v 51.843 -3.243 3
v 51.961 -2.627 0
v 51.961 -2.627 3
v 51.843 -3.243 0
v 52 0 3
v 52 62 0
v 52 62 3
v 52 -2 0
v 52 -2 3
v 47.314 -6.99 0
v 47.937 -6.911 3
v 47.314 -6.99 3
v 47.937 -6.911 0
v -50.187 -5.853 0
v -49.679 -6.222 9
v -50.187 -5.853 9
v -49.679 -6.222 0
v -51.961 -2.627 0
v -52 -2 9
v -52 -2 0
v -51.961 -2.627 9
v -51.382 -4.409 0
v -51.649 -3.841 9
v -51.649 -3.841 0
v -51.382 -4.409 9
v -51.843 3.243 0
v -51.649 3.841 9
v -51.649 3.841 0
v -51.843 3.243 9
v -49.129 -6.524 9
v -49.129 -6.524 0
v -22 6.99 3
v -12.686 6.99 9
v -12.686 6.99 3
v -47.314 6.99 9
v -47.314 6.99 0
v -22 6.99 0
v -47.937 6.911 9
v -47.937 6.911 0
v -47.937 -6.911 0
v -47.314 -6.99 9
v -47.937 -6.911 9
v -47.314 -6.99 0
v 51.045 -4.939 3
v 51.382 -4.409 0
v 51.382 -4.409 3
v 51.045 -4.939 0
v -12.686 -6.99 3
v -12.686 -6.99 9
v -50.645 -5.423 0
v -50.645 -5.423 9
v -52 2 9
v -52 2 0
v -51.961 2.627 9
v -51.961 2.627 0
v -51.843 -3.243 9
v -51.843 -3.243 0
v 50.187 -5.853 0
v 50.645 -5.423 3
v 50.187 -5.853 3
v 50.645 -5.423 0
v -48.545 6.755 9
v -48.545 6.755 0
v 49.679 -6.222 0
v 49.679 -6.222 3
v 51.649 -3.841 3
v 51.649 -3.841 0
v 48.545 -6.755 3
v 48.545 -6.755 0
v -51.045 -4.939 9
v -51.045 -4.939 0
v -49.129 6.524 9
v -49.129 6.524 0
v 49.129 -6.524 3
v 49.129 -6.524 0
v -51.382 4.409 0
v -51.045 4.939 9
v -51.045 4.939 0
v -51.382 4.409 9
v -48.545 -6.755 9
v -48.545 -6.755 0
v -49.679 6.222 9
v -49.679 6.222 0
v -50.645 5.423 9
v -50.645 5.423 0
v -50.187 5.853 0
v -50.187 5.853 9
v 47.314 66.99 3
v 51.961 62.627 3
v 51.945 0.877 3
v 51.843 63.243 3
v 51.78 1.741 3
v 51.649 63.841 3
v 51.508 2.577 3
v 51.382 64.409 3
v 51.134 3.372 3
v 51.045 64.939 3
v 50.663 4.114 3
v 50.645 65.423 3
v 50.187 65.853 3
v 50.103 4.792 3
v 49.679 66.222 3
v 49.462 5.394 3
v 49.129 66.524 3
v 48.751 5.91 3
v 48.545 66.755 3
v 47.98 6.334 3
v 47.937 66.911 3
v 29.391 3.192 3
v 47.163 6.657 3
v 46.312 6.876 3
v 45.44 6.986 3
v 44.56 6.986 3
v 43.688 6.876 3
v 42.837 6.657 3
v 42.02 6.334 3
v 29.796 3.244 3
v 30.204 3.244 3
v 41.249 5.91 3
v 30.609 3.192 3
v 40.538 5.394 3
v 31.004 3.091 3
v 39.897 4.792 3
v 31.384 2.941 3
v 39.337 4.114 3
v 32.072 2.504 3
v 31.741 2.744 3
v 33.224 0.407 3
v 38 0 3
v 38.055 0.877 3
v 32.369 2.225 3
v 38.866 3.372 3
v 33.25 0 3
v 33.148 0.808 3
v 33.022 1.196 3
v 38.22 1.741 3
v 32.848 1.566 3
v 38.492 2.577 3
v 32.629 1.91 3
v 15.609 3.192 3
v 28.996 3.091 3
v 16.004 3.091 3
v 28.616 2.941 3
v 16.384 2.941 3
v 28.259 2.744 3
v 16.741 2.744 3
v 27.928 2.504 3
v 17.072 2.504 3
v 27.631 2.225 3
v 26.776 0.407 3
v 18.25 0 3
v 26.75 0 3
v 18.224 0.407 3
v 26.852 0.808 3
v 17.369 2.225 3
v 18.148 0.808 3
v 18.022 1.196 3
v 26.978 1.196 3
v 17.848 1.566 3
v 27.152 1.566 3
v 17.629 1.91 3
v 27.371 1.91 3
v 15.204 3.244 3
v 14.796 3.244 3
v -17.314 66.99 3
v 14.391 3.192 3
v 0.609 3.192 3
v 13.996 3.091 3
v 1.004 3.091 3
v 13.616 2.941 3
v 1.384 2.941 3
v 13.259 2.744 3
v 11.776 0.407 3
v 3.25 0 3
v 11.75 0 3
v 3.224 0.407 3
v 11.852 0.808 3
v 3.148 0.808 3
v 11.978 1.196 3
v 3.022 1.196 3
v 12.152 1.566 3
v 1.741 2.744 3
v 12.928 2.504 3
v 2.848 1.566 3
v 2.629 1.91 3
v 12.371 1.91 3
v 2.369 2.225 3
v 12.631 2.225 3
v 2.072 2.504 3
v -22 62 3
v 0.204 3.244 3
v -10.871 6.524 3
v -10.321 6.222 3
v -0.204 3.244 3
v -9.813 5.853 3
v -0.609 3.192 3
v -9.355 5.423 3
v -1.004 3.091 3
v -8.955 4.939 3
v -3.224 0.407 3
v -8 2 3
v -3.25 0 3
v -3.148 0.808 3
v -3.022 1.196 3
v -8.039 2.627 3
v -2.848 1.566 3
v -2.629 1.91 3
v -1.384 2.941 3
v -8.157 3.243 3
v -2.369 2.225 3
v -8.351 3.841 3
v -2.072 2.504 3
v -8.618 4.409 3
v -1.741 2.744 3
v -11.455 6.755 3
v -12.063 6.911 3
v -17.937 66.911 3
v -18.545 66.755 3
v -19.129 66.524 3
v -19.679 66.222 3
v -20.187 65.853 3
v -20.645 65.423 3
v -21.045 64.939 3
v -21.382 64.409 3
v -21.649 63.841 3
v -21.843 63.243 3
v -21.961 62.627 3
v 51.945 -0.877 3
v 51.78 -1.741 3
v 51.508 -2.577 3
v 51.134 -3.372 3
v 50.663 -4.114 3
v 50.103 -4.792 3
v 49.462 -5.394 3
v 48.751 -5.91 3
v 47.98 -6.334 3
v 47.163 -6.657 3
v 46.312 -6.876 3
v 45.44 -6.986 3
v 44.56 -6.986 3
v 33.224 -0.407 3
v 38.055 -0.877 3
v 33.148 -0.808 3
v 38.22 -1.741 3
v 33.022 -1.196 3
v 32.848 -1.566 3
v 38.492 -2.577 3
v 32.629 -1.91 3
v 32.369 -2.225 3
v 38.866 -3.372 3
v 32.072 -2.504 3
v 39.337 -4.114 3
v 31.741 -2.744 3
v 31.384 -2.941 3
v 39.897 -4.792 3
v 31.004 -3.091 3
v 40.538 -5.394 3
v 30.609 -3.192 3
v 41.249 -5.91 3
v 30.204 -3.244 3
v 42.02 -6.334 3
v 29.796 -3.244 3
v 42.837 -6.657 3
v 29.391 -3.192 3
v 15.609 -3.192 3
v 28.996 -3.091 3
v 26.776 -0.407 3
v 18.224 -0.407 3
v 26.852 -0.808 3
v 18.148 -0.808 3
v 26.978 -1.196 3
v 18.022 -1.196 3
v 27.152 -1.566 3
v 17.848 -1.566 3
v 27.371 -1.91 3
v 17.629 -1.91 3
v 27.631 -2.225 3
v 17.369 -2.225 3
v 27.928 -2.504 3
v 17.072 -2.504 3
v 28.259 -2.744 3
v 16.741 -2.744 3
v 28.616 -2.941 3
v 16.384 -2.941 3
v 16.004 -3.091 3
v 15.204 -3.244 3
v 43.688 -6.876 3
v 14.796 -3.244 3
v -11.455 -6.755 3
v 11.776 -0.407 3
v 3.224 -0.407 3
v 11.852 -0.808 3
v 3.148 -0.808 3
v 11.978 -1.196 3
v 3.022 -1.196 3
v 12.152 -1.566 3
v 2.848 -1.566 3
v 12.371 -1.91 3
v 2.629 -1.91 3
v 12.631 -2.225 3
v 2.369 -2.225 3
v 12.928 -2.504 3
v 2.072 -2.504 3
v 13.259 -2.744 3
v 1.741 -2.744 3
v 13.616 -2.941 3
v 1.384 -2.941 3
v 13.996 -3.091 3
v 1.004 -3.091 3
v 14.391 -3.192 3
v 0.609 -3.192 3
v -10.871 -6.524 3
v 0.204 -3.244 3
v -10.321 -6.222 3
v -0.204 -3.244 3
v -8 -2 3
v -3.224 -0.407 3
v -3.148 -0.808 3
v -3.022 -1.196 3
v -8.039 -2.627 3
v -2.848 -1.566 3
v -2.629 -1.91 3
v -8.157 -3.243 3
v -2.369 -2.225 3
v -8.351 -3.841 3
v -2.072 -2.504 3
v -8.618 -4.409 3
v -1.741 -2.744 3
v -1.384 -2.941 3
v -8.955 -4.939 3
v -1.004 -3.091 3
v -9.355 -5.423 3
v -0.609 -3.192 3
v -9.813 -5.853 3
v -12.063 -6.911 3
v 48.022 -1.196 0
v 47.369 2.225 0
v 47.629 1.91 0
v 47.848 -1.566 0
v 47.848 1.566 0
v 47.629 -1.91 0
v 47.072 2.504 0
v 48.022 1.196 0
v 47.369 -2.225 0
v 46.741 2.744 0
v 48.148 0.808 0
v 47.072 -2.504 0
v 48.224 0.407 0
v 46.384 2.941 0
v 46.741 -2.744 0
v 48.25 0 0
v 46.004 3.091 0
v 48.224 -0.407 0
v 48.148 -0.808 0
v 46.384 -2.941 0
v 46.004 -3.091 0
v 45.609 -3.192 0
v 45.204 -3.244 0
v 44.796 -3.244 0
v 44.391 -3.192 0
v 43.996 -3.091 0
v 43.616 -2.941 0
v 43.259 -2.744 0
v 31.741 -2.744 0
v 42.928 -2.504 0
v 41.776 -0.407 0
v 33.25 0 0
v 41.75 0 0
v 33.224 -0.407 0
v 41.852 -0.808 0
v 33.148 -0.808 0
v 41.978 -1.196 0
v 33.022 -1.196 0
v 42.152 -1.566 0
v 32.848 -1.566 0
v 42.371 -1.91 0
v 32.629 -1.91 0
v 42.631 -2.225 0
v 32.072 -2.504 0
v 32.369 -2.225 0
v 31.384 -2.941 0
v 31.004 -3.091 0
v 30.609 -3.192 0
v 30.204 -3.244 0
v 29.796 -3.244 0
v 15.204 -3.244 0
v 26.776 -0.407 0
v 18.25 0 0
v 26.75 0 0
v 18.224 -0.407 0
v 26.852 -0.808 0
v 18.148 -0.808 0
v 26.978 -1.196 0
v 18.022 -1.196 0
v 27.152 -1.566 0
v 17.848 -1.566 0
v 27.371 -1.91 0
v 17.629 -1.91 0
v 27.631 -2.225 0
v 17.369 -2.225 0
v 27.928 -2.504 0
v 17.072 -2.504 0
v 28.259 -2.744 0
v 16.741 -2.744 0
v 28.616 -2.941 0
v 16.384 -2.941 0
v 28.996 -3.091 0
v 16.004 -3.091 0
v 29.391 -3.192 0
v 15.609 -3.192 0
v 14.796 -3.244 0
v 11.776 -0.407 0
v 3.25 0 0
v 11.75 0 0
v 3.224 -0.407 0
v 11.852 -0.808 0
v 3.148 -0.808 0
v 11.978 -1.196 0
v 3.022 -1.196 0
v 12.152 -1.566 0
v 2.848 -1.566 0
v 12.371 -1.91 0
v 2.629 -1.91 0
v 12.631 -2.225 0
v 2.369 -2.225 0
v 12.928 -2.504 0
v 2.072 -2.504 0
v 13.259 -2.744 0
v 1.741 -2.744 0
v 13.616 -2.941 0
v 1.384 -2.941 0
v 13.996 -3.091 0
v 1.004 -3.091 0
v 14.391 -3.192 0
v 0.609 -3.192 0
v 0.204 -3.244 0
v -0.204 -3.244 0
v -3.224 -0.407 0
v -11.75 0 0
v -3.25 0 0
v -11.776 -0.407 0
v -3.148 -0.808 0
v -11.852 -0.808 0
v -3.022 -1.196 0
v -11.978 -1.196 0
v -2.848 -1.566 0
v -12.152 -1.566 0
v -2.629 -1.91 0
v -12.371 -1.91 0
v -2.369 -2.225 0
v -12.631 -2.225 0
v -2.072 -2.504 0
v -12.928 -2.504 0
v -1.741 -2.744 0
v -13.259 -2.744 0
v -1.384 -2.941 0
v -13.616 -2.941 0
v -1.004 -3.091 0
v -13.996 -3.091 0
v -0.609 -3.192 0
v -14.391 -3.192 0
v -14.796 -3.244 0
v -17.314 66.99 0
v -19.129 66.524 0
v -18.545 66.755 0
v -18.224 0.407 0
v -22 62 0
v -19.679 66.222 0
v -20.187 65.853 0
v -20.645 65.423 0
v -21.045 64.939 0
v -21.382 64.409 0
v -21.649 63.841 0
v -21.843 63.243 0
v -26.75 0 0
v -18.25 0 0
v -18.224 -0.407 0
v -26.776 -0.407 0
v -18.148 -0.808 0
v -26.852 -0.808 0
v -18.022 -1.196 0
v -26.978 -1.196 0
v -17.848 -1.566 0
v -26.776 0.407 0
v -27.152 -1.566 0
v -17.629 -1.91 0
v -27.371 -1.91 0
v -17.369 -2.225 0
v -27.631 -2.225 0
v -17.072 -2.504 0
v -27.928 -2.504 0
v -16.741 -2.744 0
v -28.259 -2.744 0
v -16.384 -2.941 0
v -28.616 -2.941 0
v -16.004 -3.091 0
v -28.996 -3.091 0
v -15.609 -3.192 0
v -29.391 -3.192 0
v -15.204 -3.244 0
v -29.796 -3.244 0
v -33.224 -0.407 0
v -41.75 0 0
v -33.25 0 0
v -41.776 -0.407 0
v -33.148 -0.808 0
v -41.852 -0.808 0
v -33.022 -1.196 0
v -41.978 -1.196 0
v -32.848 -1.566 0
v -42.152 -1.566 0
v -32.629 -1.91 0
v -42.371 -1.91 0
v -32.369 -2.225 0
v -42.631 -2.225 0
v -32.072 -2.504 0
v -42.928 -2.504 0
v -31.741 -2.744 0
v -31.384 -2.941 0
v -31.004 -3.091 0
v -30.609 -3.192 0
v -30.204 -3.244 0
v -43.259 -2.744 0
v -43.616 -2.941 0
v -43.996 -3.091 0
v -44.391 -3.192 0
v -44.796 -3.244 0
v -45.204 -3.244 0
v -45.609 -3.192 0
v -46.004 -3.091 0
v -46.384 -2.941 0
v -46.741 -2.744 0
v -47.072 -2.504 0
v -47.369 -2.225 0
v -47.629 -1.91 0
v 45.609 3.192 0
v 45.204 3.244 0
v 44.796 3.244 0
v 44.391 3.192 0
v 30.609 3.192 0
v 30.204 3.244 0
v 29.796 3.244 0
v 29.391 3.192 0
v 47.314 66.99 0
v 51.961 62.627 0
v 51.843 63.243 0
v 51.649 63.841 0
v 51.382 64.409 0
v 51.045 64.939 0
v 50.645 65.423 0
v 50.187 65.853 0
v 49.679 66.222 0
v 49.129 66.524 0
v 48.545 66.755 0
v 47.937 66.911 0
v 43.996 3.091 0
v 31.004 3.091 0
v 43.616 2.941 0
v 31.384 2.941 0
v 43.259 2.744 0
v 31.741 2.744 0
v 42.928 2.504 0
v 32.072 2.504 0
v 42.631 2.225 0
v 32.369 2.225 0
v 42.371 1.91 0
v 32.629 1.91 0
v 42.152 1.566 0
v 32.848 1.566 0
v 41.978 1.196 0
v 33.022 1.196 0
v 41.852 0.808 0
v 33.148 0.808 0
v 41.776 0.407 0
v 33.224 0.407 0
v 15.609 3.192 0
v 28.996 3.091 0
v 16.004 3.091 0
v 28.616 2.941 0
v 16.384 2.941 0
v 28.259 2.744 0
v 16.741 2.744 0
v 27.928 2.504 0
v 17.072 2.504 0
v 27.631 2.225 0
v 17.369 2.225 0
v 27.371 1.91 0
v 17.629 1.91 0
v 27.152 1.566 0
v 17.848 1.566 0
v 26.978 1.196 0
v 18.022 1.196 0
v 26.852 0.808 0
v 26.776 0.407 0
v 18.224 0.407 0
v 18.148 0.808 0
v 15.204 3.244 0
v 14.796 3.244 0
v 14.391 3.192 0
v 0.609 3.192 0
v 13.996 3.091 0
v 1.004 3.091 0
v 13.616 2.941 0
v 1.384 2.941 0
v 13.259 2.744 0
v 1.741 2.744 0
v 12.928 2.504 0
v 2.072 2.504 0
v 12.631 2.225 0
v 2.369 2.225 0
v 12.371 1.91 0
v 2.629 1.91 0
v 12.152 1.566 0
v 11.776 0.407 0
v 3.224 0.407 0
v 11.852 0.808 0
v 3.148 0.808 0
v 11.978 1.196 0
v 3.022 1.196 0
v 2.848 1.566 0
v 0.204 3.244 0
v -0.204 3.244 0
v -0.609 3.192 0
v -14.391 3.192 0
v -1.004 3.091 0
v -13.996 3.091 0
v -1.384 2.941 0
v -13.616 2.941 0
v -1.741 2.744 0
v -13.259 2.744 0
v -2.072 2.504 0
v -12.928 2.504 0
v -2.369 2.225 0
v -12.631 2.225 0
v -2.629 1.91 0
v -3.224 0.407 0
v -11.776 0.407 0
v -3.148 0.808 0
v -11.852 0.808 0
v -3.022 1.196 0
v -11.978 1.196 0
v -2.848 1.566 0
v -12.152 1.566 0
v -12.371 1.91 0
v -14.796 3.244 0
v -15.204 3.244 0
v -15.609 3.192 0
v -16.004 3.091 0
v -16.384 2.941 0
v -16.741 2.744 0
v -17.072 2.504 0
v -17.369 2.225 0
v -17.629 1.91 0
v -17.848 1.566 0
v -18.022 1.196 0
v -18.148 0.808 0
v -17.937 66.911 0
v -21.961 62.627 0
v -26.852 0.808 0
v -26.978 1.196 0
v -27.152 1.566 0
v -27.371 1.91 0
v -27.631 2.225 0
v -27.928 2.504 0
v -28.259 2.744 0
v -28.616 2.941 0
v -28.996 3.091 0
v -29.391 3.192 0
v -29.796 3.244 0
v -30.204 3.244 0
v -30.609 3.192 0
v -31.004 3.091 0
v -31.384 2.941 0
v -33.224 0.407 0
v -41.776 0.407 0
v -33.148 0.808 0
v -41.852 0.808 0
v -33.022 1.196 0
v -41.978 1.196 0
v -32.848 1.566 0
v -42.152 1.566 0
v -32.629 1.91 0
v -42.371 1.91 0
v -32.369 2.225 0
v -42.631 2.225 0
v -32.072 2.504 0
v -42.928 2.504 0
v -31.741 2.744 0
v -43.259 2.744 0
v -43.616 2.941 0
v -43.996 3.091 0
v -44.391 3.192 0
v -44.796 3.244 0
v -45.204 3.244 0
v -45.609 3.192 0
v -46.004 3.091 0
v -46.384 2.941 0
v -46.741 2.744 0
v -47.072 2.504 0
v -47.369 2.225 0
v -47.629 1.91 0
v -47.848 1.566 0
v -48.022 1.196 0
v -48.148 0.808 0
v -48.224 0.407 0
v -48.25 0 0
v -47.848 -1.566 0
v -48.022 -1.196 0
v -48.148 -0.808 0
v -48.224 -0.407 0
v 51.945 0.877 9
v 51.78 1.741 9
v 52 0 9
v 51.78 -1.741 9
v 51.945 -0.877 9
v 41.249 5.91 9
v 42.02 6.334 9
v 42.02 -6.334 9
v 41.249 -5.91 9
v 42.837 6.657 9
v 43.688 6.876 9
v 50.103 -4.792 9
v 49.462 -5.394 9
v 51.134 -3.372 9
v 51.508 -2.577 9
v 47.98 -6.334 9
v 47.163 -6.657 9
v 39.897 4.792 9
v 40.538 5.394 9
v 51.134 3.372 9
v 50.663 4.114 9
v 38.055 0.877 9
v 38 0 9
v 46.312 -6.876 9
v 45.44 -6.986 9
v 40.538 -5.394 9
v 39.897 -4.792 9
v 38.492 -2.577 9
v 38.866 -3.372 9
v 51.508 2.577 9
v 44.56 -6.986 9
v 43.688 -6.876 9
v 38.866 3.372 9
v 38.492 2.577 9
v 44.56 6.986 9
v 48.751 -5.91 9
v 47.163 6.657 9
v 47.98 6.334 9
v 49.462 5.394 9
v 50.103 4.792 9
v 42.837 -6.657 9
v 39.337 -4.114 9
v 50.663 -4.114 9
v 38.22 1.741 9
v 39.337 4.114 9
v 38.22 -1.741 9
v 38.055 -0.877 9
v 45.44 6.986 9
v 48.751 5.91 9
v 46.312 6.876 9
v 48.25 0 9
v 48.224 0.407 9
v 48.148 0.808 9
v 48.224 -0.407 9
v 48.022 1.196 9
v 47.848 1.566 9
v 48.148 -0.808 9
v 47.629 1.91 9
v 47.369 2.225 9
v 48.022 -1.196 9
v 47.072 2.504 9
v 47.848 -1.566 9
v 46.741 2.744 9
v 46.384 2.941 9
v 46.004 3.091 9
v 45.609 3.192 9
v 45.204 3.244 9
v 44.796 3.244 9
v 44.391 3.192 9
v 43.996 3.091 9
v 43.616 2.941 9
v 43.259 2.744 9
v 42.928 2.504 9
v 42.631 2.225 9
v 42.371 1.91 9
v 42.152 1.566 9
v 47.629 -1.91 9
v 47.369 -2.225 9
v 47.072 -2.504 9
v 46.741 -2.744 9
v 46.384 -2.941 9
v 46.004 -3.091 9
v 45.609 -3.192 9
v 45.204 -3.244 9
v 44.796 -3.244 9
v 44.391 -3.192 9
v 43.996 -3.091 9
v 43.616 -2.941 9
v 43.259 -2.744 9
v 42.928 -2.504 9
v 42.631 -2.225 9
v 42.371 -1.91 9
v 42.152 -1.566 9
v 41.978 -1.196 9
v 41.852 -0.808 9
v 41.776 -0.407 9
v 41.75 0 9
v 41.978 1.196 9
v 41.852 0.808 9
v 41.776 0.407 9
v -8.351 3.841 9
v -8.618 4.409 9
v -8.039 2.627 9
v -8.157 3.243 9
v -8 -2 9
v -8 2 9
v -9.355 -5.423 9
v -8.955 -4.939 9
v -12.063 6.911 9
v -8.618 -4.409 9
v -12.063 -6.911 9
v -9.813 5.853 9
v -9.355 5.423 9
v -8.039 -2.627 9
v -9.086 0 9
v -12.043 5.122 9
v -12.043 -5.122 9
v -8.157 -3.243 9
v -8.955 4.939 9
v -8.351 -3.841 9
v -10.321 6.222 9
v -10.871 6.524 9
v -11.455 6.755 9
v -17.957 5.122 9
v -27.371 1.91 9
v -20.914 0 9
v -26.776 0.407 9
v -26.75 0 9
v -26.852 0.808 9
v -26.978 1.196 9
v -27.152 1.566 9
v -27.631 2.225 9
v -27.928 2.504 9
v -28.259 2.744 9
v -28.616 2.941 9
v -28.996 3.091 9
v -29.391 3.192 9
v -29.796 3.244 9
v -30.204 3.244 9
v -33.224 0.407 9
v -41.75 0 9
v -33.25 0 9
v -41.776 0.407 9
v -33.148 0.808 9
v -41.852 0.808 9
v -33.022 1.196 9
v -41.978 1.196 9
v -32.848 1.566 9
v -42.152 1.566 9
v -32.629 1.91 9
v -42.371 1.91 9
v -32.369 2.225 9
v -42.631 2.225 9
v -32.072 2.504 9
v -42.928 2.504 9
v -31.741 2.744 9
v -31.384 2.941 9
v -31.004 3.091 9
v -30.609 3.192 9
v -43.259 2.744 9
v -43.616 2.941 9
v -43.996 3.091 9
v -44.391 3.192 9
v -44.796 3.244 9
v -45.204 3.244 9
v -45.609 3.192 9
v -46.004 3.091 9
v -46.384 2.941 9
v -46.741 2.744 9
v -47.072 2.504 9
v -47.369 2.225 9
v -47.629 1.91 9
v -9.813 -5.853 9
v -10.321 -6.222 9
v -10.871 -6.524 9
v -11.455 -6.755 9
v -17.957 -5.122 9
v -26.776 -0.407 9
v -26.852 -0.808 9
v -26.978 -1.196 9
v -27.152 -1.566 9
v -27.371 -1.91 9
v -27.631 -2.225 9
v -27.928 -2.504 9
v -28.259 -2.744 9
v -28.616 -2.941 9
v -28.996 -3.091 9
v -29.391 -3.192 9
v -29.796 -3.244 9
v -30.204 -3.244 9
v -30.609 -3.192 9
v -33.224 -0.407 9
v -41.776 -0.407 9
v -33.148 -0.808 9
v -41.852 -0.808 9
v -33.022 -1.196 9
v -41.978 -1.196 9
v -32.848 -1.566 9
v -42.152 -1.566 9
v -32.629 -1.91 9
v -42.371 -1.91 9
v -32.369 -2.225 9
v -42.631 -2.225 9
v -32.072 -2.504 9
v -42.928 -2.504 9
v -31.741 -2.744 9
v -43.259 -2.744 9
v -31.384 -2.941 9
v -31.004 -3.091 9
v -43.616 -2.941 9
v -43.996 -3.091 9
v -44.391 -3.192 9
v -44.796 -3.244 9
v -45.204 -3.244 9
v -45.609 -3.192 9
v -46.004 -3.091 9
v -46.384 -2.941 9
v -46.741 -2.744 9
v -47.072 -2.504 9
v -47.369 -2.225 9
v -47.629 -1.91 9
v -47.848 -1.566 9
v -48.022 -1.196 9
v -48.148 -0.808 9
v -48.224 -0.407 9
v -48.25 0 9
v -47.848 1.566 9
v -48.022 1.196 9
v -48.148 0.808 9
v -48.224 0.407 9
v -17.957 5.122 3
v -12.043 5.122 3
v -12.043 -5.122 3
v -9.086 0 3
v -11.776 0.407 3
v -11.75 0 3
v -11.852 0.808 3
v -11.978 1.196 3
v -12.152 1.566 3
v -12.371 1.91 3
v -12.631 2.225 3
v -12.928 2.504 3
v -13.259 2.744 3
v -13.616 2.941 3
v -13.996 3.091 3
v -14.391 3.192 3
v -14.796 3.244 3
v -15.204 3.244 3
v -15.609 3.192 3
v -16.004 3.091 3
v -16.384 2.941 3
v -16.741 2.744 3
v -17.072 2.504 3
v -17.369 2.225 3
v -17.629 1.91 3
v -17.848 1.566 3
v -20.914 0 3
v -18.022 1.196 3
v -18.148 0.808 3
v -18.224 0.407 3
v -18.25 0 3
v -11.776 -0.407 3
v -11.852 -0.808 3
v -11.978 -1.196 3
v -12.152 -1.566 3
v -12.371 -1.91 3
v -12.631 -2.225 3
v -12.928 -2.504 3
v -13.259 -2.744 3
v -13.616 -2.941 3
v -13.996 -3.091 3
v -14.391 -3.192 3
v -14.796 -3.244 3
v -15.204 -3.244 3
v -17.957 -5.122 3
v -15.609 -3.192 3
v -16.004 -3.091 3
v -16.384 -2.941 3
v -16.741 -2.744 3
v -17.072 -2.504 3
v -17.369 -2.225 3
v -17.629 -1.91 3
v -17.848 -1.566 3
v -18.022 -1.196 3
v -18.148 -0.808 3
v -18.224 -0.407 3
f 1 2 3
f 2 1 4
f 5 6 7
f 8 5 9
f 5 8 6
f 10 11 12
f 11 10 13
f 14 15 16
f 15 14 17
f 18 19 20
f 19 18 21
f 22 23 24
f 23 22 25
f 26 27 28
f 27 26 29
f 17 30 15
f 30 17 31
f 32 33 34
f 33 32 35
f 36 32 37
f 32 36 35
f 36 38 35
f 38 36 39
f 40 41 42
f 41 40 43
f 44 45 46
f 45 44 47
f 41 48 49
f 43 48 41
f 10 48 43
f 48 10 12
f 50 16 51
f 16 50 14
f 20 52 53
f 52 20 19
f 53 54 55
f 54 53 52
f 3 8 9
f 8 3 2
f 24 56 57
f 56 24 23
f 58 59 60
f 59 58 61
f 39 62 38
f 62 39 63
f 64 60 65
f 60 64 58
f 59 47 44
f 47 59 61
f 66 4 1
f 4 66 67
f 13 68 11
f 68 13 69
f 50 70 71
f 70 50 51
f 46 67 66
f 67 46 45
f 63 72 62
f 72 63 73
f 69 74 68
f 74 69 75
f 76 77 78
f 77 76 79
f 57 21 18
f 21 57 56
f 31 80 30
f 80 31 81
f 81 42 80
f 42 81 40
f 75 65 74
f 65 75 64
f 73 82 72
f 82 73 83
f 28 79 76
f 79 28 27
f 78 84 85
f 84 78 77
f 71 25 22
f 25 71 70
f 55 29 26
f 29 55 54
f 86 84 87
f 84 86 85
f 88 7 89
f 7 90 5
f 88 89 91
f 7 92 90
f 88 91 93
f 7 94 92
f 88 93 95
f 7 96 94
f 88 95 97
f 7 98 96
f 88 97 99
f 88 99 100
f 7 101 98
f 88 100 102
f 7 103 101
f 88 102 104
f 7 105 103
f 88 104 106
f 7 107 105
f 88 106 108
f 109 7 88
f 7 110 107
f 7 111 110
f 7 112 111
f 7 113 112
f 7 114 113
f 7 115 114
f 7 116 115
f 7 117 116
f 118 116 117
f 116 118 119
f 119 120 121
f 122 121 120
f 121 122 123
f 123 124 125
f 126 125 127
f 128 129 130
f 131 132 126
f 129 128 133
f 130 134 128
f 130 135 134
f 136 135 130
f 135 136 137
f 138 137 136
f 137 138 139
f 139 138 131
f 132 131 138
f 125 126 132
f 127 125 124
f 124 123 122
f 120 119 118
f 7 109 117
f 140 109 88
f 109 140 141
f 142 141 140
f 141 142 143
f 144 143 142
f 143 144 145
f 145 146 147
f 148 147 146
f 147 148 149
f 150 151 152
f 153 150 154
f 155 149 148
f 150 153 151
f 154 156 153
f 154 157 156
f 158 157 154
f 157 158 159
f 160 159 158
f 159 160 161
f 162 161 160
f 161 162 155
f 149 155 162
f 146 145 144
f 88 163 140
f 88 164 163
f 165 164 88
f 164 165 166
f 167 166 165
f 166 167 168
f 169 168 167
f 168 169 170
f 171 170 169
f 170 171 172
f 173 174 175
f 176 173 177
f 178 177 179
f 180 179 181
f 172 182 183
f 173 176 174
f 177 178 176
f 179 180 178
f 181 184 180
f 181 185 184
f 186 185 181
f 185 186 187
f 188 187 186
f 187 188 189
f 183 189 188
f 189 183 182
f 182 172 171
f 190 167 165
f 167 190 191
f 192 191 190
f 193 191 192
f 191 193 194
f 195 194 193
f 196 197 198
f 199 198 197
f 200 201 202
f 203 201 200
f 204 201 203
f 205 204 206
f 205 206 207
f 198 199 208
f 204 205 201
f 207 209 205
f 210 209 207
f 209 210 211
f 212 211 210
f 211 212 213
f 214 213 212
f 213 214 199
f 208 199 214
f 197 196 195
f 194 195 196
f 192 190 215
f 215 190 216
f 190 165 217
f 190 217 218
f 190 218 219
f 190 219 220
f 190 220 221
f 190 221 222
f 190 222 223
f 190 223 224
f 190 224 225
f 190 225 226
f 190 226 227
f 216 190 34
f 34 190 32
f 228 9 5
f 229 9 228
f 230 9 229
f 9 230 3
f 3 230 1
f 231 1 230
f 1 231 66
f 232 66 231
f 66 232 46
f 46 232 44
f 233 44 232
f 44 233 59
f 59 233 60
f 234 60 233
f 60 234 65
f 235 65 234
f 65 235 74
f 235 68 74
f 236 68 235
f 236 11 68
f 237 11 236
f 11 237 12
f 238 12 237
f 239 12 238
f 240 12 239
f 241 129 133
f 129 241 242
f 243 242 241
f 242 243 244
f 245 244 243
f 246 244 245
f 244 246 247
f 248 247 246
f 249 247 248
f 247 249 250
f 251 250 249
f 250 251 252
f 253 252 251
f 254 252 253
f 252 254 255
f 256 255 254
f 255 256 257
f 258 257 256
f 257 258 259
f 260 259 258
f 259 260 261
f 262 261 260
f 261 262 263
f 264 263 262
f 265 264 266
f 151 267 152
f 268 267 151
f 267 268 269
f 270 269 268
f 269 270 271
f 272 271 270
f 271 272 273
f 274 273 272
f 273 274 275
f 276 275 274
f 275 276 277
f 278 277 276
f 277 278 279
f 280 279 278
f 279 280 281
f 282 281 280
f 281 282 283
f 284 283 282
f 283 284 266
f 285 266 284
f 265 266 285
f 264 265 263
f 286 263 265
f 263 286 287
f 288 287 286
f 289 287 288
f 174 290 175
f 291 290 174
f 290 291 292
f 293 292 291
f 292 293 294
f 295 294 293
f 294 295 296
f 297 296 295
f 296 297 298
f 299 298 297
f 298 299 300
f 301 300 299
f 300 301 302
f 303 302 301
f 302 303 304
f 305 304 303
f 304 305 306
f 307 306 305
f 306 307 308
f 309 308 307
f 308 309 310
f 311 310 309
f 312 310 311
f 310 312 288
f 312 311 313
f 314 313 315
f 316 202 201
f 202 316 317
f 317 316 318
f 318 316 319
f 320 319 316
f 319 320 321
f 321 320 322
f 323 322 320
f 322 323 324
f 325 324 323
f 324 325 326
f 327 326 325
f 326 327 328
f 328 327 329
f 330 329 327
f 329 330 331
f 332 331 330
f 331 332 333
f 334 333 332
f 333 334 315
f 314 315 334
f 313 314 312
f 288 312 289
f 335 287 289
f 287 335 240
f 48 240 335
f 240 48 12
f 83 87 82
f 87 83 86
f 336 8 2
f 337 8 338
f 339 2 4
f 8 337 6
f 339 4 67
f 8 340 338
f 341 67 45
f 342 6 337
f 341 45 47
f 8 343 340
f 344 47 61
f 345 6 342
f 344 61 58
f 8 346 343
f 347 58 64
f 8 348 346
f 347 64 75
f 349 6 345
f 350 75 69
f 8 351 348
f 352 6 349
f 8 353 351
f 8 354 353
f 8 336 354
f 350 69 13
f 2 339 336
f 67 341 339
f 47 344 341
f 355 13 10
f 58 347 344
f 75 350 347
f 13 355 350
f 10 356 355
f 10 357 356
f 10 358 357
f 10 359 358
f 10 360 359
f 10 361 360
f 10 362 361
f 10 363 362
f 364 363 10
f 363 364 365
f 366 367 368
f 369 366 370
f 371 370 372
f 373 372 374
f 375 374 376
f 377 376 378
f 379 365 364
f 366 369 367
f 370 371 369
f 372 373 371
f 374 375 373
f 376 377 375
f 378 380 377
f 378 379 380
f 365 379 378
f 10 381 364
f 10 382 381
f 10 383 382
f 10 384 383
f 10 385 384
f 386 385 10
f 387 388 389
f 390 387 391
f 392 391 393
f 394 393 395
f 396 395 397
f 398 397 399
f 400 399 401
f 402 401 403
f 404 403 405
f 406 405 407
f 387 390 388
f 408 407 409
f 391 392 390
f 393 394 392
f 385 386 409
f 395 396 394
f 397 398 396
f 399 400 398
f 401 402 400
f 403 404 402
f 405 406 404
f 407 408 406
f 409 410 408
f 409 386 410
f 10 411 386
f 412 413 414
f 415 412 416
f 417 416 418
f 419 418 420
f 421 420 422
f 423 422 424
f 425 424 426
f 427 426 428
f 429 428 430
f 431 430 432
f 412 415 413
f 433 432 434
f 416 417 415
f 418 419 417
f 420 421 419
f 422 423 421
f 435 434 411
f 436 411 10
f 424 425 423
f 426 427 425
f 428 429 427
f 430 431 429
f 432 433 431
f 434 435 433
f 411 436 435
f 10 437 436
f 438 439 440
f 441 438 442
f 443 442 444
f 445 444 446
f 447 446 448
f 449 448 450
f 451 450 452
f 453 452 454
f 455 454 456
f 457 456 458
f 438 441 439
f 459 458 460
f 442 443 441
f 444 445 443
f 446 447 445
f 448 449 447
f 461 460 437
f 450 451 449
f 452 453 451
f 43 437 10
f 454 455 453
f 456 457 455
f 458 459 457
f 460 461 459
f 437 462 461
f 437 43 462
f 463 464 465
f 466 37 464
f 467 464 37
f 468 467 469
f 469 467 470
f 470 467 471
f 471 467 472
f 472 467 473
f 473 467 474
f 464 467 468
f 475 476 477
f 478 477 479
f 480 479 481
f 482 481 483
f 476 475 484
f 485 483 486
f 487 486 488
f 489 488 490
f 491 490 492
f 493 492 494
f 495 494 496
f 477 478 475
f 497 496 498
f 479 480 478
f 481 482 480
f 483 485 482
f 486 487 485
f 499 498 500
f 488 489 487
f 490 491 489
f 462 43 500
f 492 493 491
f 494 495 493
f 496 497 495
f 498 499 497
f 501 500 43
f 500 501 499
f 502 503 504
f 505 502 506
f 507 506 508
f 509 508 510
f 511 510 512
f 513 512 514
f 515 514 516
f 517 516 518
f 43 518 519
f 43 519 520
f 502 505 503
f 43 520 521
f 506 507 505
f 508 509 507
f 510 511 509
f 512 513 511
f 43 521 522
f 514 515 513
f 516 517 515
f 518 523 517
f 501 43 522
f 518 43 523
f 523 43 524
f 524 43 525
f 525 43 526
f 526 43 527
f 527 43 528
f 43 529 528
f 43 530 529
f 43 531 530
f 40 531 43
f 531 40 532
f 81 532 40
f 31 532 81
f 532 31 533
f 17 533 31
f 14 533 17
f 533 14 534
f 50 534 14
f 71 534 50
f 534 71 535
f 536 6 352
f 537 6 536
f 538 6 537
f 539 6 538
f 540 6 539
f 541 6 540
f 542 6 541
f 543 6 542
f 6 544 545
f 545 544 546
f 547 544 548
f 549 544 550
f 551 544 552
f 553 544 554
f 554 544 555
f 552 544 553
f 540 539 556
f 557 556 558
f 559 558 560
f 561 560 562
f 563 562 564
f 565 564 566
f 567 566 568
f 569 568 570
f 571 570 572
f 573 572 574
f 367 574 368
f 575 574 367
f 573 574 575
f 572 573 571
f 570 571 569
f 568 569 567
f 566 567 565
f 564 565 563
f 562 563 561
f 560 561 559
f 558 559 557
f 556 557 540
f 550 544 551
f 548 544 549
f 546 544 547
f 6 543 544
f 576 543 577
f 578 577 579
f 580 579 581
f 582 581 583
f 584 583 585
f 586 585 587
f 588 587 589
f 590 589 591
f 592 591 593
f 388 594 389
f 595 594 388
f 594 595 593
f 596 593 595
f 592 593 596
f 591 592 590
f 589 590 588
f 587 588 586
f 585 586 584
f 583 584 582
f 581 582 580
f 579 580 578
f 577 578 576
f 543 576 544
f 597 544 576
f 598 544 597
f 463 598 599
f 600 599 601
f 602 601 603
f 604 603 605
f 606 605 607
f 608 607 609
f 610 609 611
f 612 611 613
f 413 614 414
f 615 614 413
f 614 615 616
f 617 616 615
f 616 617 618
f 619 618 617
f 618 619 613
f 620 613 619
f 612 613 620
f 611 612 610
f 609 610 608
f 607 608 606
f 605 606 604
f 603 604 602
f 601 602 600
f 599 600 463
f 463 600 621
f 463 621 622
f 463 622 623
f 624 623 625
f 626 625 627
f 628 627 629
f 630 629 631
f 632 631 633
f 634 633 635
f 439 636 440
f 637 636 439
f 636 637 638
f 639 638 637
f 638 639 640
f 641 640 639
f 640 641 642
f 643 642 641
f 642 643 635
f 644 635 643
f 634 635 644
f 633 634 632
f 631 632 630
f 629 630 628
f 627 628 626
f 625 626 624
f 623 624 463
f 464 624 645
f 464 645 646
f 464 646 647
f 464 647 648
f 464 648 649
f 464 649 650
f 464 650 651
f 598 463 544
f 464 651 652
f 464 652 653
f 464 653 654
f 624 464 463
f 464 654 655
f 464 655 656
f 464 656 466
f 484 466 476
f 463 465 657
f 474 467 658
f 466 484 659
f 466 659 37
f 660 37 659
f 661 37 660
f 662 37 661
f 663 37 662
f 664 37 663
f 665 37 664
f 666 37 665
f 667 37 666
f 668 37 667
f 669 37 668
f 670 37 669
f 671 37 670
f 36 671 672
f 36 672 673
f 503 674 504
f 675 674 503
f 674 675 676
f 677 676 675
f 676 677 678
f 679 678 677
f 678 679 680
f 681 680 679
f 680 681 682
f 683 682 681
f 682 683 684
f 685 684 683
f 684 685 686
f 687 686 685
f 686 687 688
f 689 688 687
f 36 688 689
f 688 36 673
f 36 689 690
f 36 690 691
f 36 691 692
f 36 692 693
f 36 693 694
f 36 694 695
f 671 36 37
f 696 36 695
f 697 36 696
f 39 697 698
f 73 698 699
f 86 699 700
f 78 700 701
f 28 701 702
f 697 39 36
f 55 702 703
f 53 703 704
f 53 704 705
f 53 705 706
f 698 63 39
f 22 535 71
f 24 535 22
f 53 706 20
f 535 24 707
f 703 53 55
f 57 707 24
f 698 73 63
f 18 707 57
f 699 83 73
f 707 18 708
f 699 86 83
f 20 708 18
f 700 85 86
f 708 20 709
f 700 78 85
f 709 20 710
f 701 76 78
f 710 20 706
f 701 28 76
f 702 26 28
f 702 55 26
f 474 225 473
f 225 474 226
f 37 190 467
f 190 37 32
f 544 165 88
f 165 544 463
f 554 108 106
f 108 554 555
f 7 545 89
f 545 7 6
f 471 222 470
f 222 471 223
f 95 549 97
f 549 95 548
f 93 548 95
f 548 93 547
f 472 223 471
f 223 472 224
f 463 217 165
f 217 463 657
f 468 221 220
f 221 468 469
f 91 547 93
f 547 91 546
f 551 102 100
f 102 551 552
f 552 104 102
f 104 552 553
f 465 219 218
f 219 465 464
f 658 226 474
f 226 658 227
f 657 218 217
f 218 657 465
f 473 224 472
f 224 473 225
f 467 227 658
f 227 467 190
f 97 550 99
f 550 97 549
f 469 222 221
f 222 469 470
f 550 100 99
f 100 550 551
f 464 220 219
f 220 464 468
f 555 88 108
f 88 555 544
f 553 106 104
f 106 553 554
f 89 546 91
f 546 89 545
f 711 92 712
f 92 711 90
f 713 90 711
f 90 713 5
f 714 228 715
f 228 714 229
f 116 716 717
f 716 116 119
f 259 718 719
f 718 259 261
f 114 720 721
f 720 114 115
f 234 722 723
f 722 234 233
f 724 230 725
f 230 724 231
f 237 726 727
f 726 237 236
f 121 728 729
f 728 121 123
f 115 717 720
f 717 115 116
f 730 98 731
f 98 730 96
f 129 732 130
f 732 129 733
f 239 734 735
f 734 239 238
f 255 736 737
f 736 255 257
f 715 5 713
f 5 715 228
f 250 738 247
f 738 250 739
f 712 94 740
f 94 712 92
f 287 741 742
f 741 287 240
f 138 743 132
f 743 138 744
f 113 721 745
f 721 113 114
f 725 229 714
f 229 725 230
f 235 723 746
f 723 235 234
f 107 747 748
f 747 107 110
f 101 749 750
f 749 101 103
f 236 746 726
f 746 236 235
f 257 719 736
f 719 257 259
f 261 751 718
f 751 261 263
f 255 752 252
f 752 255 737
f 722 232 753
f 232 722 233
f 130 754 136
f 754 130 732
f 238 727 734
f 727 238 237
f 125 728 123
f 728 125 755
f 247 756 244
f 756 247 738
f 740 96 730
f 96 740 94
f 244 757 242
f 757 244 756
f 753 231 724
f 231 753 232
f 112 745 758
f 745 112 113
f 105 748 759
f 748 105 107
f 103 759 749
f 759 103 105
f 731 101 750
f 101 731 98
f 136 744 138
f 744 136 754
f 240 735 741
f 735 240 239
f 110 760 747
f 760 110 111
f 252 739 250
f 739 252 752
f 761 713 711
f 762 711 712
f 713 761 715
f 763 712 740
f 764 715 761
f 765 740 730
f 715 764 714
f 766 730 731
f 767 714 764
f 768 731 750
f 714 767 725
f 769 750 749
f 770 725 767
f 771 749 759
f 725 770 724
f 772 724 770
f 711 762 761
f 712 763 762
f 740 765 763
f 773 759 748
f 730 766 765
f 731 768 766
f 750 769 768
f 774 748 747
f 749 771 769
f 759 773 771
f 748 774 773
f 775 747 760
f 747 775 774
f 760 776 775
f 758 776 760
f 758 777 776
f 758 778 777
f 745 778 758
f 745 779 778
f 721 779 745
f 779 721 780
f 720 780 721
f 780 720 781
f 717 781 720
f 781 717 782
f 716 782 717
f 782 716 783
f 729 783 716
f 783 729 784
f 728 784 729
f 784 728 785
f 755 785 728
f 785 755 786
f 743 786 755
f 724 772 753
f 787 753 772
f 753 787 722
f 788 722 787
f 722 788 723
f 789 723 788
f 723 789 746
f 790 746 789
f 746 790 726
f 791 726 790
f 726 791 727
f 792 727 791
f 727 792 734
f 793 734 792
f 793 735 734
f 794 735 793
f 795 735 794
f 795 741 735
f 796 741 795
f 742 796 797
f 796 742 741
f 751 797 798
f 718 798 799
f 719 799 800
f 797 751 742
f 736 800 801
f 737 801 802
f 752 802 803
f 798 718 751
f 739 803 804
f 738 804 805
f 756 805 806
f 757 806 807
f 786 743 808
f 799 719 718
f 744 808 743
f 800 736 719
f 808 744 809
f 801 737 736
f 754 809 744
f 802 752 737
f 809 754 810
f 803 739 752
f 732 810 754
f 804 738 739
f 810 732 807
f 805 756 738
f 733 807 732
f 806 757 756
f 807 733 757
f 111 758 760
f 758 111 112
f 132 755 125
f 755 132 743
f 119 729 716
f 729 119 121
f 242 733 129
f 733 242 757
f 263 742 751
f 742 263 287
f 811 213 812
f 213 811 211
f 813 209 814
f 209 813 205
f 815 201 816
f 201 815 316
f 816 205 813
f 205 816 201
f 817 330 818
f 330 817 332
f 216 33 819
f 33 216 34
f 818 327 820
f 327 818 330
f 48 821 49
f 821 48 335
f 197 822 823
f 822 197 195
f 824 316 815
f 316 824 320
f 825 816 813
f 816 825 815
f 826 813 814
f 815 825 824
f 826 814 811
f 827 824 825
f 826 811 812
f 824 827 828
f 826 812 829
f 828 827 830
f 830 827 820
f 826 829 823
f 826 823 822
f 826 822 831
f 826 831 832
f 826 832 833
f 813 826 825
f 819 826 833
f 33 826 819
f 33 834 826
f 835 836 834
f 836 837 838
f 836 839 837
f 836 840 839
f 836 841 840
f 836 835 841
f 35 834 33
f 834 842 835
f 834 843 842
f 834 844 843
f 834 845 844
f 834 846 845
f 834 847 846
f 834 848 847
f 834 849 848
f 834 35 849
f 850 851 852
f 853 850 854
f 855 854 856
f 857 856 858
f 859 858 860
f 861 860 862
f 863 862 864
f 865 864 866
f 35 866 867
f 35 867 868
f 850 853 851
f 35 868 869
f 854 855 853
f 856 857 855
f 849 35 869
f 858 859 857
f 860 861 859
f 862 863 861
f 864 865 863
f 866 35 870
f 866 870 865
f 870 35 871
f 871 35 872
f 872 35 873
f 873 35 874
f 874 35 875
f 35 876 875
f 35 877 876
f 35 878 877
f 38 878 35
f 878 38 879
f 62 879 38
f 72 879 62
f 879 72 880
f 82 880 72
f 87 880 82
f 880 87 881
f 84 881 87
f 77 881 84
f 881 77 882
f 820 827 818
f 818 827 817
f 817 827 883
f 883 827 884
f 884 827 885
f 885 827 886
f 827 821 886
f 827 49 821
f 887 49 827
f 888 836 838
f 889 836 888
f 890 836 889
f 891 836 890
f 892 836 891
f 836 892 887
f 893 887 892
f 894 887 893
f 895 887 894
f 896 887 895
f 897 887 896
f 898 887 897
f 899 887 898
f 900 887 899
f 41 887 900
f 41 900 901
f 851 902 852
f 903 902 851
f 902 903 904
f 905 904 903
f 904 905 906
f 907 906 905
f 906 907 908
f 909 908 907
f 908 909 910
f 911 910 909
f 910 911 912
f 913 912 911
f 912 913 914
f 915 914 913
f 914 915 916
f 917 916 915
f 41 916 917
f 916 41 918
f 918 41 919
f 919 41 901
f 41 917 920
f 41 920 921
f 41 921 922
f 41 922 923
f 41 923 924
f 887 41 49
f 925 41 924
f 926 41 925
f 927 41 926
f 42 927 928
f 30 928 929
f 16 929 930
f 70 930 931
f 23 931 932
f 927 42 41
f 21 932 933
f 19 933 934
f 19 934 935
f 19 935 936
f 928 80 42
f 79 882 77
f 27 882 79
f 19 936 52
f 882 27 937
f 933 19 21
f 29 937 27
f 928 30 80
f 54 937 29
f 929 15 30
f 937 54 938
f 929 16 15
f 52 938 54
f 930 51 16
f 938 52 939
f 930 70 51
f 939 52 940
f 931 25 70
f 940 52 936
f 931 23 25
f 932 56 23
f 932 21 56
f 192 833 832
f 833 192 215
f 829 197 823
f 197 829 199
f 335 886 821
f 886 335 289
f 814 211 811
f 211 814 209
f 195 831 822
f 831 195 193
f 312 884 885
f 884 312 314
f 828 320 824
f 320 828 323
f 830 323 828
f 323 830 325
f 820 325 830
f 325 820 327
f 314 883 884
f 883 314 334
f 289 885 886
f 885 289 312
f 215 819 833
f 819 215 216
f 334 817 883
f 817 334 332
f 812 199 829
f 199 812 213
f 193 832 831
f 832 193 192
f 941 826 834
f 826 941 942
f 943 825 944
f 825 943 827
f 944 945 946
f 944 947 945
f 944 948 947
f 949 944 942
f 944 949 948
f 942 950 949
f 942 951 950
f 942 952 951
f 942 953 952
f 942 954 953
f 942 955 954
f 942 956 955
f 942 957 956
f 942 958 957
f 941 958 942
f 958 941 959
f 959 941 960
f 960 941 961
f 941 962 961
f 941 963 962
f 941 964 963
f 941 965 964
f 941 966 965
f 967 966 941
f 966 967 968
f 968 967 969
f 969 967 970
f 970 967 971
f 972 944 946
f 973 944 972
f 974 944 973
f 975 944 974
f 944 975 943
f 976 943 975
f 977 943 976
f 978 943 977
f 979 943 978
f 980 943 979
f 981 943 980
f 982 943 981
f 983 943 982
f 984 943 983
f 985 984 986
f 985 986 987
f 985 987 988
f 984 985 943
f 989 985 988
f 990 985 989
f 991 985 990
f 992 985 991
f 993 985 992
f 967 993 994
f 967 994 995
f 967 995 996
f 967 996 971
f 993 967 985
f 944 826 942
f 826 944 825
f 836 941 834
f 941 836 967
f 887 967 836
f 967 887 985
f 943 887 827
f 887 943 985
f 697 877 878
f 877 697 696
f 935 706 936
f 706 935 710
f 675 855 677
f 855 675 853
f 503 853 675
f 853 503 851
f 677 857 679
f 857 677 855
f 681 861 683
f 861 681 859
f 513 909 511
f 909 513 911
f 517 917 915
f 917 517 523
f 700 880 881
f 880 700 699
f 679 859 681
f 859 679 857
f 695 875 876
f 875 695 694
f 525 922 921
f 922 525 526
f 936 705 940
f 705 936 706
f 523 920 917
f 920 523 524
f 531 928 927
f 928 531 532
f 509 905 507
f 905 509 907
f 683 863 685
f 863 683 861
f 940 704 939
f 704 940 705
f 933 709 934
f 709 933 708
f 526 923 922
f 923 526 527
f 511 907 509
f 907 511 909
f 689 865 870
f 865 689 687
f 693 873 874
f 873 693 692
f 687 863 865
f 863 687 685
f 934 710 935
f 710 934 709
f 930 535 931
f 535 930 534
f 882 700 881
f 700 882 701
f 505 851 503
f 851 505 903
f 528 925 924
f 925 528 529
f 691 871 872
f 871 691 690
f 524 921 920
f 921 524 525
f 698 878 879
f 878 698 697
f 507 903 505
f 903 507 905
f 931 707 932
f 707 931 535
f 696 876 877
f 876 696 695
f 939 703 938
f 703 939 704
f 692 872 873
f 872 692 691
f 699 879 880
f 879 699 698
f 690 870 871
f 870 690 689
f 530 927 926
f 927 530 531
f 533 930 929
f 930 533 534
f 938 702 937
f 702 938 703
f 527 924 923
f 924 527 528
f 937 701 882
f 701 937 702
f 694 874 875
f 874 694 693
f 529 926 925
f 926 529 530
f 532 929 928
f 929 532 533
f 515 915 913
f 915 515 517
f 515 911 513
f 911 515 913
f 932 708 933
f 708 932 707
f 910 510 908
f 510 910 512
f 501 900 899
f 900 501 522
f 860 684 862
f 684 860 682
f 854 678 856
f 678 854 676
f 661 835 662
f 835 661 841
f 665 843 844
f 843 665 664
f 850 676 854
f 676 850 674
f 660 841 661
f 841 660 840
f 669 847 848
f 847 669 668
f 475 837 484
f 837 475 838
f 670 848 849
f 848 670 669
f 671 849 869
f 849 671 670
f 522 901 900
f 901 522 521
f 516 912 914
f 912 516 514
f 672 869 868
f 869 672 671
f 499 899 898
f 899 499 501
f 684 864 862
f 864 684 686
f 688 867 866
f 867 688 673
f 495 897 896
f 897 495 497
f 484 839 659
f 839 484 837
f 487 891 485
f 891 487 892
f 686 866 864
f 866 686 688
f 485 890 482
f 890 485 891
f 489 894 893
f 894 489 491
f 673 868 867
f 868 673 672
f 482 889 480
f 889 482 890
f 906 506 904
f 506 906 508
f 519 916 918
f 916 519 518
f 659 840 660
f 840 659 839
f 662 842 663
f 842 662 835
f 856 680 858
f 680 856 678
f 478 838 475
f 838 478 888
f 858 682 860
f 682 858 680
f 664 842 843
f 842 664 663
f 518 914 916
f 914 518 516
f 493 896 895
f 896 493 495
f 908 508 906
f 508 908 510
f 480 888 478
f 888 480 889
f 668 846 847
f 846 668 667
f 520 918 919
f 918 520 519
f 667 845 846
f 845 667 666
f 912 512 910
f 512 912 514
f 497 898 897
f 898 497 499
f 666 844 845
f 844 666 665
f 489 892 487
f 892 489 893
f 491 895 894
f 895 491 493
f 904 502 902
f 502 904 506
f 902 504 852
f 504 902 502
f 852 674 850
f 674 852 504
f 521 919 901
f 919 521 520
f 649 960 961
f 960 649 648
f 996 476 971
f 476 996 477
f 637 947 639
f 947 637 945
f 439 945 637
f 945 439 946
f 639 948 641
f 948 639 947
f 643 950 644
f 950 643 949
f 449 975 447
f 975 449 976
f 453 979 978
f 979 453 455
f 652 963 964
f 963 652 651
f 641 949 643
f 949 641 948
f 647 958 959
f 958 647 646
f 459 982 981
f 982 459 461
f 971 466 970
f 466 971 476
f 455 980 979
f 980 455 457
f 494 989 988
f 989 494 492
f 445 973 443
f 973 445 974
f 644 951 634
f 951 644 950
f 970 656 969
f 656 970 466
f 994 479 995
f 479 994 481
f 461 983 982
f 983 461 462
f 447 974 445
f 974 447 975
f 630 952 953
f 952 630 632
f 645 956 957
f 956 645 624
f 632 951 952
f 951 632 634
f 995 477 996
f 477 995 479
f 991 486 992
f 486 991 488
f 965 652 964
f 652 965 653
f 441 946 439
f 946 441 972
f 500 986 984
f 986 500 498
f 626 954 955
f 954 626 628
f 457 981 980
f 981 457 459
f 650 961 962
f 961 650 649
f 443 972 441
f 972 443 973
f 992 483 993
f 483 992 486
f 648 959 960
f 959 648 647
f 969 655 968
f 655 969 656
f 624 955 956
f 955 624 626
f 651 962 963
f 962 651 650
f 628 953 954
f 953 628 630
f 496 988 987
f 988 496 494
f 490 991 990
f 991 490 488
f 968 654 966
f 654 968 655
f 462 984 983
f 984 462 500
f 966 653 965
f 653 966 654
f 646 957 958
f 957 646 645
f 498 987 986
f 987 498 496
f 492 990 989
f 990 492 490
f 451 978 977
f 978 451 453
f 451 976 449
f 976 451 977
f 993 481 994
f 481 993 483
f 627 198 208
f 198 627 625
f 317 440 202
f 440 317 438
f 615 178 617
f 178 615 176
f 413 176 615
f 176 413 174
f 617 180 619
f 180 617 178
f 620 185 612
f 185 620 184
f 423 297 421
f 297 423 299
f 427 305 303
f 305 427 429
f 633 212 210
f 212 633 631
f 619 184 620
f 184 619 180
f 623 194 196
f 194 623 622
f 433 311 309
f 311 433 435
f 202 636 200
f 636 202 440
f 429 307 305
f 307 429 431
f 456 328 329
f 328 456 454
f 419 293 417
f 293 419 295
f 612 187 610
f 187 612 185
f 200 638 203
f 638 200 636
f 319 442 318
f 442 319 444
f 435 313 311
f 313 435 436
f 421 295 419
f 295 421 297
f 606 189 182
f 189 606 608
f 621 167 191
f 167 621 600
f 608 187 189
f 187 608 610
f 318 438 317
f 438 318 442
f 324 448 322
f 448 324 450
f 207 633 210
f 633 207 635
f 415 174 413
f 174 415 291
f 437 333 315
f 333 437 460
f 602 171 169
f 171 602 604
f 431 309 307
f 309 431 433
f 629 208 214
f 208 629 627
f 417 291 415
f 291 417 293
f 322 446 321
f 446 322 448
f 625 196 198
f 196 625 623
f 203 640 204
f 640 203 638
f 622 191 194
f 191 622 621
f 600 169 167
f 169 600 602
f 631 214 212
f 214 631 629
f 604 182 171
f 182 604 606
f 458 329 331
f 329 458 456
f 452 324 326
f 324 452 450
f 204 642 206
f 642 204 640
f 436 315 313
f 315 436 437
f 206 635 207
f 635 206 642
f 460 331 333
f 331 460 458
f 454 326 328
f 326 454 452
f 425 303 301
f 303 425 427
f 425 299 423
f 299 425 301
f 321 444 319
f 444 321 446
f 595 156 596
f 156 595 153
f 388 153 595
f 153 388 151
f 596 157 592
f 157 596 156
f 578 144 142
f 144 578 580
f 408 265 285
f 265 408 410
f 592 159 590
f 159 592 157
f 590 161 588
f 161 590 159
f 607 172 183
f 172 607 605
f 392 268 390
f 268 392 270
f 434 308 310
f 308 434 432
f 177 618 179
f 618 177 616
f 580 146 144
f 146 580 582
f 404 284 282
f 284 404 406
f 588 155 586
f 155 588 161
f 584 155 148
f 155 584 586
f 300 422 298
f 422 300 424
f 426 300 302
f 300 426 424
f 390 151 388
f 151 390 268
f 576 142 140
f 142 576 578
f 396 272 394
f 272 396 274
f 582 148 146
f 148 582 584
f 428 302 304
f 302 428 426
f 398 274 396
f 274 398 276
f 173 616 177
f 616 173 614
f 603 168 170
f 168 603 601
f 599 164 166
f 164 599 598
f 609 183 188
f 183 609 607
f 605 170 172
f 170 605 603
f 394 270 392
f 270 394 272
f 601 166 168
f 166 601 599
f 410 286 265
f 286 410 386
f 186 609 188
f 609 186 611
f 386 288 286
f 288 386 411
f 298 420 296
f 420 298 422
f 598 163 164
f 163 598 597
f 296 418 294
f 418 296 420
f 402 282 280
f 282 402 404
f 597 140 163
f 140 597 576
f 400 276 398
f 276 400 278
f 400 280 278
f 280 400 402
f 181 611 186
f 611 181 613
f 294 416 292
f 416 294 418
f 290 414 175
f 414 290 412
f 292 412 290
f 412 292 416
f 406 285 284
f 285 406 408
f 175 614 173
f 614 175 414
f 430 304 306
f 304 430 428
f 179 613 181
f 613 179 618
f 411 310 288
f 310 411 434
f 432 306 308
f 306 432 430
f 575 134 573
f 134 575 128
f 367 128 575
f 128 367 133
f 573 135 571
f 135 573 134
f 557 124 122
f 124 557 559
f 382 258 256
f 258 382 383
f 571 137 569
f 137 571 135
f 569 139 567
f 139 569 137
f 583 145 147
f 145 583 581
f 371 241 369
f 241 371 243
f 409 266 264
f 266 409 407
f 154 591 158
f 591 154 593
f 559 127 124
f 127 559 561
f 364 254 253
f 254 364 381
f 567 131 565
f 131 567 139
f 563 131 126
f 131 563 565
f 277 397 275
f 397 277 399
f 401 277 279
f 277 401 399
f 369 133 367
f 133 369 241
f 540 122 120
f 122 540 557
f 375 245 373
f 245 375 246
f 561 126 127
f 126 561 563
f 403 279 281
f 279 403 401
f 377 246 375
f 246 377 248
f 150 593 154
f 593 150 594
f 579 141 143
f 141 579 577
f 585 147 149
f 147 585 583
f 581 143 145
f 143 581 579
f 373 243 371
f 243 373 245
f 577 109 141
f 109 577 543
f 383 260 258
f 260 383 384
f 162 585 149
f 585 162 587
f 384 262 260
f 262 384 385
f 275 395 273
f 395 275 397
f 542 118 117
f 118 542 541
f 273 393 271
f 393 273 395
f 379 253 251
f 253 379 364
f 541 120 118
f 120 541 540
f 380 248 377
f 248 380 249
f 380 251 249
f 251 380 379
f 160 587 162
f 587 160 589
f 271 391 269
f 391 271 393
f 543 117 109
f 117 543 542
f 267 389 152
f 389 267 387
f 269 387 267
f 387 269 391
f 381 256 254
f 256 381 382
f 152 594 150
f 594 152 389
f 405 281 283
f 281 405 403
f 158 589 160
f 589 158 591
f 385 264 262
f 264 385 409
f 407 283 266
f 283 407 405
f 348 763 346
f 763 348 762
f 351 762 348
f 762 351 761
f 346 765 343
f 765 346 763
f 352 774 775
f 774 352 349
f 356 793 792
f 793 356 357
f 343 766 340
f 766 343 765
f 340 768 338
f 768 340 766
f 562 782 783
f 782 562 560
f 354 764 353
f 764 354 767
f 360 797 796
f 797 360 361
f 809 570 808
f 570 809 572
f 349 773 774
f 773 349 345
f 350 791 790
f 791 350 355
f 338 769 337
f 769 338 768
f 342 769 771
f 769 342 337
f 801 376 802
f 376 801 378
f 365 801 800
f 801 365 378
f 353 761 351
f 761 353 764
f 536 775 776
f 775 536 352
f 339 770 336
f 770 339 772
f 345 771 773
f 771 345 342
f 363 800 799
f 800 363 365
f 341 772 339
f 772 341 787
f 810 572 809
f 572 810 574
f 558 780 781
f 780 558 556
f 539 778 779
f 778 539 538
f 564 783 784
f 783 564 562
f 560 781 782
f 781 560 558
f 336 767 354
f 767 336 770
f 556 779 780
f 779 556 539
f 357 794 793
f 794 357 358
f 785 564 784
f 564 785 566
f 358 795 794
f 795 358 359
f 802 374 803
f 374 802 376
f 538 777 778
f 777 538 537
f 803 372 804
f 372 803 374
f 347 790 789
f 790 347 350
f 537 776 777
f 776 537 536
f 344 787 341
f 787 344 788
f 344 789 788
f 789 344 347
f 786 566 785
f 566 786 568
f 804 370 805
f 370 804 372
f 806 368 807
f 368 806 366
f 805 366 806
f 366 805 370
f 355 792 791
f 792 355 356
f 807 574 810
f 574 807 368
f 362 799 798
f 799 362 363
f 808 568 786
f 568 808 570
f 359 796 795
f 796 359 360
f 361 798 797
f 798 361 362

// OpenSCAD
$fn = 50;


difference() {
	union() {
		hull() {
			translate(v = [-47.0000000000, 2.0000000000, 0]) {
				cylinder(h = 3, r = 5);
			}
			translate(v = [47.0000000000, 2.0000000000, 0]) {
				cylinder(h = 3, r = 5);
			}
			translate(v = [-47.0000000000, -2.0000000000, 0]) {
				cylinder(h = 3, r = 5);
			}
			translate(v = [47.0000000000, -2.0000000000, 0]) {
				cylinder(h = 3, r = 5);
			}
		}
		translate(v = [15, 30, 0]) {
			hull() {
				translate(v = [-32.0000000000, 32.0000000000, 0]) {
					cylinder(h = 3, r = 5);
				}
				translate(v = [32.0000000000, 32.0000000000, 0]) {
					cylinder(h = 3, r = 5);
				}
				translate(v = [-32.0000000000, -32.0000000000, 0]) {
					cylinder(h = 3, r = 5);
				}
				translate(v = [32.0000000000, -32.0000000000, 0]) {
					cylinder(h = 3, r = 5);
				}
			}
		}
		translate(v = [45.0000000000, 0, 0]) {
			cylinder(h = 9, r = 7.0000000000);
		}
		translate(v = [-30.0000000000, 0, 0]) {
			hull() {
				translate(v = [-17.0000000000, 2.0000000000, 0]) {
					cylinder(h = 9, r = 5);
				}
				translate(v = [17.0000000000, 2.0000000000, 0]) {
					cylinder(h = 9, r = 5);
				}
				translate(v = [-17.0000000000, -2.0000000000, 0]) {
					cylinder(h = 9, r = 5);
				}
				translate(v = [17.0000000000, -2.0000000000, 0]) {
					cylinder(h = 9, r = 5);
				}
			}
		}
	}
	union() {
		translate(v = [-15.0000000000, 0, 9]) {
			rotate(a = [0, 0, 0]) {
				difference() {
					union() {
						translate(v = [0, 0, -6]) {
							linear_extrude(height = 6) {
								polygon(points = [[5.9142500000, 0.0000000000], [2.9571250000, 5.1218907443], [-2.9571250000, 5.1218907443], [-5.9142500000, 0.0000000000], [-2.9571250000, -5.1218907443], [2.9571250000, -5.1218907443]]);
							}
						}
					}
					union();
				}
			}
		}
		translate(v = [-45.0000000000, 0.0000000000, 0]) {
			translate(v = [0, 0, -50]) {
				cylinder(h = 100, r = 3.2500000000);
			}
		}
		translate(v = [-30.0000000000, 0.0000000000, 0]) {
			translate(v = [0, 0, -50]) {
				cylinder(h = 100, r = 3.2500000000);
			}
		}
		translate(v = [-15.0000000000, 0.0000000000, 0]) {
			translate(v = [0, 0, -50]) {
				cylinder(h = 100, r = 3.2500000000);
			}
		}
		translate(v = [0, 0, -50]) {
			cylinder(h = 100, r = 3.2500000000);
		}
		translate(v = [15.0000000000, 0.0000000000, 0]) {
			translate(v = [0, 0, -50]) {
				cylinder(h = 100, r = 3.2500000000);
			}
		}
		translate(v = [30.0000000000, 0.0000000000, 0]) {
			translate(v = [0, 0, -50]) {
				cylinder(h = 100, r = 3.2500000000);
			}
		}
		translate(v = [45.0000000000, 0.0000000000, 0]) {
			translate(v = [0, 0, -50]) {
				cylinder(h = 100, r = 3.2500000000);
			}
		}
	}
}
